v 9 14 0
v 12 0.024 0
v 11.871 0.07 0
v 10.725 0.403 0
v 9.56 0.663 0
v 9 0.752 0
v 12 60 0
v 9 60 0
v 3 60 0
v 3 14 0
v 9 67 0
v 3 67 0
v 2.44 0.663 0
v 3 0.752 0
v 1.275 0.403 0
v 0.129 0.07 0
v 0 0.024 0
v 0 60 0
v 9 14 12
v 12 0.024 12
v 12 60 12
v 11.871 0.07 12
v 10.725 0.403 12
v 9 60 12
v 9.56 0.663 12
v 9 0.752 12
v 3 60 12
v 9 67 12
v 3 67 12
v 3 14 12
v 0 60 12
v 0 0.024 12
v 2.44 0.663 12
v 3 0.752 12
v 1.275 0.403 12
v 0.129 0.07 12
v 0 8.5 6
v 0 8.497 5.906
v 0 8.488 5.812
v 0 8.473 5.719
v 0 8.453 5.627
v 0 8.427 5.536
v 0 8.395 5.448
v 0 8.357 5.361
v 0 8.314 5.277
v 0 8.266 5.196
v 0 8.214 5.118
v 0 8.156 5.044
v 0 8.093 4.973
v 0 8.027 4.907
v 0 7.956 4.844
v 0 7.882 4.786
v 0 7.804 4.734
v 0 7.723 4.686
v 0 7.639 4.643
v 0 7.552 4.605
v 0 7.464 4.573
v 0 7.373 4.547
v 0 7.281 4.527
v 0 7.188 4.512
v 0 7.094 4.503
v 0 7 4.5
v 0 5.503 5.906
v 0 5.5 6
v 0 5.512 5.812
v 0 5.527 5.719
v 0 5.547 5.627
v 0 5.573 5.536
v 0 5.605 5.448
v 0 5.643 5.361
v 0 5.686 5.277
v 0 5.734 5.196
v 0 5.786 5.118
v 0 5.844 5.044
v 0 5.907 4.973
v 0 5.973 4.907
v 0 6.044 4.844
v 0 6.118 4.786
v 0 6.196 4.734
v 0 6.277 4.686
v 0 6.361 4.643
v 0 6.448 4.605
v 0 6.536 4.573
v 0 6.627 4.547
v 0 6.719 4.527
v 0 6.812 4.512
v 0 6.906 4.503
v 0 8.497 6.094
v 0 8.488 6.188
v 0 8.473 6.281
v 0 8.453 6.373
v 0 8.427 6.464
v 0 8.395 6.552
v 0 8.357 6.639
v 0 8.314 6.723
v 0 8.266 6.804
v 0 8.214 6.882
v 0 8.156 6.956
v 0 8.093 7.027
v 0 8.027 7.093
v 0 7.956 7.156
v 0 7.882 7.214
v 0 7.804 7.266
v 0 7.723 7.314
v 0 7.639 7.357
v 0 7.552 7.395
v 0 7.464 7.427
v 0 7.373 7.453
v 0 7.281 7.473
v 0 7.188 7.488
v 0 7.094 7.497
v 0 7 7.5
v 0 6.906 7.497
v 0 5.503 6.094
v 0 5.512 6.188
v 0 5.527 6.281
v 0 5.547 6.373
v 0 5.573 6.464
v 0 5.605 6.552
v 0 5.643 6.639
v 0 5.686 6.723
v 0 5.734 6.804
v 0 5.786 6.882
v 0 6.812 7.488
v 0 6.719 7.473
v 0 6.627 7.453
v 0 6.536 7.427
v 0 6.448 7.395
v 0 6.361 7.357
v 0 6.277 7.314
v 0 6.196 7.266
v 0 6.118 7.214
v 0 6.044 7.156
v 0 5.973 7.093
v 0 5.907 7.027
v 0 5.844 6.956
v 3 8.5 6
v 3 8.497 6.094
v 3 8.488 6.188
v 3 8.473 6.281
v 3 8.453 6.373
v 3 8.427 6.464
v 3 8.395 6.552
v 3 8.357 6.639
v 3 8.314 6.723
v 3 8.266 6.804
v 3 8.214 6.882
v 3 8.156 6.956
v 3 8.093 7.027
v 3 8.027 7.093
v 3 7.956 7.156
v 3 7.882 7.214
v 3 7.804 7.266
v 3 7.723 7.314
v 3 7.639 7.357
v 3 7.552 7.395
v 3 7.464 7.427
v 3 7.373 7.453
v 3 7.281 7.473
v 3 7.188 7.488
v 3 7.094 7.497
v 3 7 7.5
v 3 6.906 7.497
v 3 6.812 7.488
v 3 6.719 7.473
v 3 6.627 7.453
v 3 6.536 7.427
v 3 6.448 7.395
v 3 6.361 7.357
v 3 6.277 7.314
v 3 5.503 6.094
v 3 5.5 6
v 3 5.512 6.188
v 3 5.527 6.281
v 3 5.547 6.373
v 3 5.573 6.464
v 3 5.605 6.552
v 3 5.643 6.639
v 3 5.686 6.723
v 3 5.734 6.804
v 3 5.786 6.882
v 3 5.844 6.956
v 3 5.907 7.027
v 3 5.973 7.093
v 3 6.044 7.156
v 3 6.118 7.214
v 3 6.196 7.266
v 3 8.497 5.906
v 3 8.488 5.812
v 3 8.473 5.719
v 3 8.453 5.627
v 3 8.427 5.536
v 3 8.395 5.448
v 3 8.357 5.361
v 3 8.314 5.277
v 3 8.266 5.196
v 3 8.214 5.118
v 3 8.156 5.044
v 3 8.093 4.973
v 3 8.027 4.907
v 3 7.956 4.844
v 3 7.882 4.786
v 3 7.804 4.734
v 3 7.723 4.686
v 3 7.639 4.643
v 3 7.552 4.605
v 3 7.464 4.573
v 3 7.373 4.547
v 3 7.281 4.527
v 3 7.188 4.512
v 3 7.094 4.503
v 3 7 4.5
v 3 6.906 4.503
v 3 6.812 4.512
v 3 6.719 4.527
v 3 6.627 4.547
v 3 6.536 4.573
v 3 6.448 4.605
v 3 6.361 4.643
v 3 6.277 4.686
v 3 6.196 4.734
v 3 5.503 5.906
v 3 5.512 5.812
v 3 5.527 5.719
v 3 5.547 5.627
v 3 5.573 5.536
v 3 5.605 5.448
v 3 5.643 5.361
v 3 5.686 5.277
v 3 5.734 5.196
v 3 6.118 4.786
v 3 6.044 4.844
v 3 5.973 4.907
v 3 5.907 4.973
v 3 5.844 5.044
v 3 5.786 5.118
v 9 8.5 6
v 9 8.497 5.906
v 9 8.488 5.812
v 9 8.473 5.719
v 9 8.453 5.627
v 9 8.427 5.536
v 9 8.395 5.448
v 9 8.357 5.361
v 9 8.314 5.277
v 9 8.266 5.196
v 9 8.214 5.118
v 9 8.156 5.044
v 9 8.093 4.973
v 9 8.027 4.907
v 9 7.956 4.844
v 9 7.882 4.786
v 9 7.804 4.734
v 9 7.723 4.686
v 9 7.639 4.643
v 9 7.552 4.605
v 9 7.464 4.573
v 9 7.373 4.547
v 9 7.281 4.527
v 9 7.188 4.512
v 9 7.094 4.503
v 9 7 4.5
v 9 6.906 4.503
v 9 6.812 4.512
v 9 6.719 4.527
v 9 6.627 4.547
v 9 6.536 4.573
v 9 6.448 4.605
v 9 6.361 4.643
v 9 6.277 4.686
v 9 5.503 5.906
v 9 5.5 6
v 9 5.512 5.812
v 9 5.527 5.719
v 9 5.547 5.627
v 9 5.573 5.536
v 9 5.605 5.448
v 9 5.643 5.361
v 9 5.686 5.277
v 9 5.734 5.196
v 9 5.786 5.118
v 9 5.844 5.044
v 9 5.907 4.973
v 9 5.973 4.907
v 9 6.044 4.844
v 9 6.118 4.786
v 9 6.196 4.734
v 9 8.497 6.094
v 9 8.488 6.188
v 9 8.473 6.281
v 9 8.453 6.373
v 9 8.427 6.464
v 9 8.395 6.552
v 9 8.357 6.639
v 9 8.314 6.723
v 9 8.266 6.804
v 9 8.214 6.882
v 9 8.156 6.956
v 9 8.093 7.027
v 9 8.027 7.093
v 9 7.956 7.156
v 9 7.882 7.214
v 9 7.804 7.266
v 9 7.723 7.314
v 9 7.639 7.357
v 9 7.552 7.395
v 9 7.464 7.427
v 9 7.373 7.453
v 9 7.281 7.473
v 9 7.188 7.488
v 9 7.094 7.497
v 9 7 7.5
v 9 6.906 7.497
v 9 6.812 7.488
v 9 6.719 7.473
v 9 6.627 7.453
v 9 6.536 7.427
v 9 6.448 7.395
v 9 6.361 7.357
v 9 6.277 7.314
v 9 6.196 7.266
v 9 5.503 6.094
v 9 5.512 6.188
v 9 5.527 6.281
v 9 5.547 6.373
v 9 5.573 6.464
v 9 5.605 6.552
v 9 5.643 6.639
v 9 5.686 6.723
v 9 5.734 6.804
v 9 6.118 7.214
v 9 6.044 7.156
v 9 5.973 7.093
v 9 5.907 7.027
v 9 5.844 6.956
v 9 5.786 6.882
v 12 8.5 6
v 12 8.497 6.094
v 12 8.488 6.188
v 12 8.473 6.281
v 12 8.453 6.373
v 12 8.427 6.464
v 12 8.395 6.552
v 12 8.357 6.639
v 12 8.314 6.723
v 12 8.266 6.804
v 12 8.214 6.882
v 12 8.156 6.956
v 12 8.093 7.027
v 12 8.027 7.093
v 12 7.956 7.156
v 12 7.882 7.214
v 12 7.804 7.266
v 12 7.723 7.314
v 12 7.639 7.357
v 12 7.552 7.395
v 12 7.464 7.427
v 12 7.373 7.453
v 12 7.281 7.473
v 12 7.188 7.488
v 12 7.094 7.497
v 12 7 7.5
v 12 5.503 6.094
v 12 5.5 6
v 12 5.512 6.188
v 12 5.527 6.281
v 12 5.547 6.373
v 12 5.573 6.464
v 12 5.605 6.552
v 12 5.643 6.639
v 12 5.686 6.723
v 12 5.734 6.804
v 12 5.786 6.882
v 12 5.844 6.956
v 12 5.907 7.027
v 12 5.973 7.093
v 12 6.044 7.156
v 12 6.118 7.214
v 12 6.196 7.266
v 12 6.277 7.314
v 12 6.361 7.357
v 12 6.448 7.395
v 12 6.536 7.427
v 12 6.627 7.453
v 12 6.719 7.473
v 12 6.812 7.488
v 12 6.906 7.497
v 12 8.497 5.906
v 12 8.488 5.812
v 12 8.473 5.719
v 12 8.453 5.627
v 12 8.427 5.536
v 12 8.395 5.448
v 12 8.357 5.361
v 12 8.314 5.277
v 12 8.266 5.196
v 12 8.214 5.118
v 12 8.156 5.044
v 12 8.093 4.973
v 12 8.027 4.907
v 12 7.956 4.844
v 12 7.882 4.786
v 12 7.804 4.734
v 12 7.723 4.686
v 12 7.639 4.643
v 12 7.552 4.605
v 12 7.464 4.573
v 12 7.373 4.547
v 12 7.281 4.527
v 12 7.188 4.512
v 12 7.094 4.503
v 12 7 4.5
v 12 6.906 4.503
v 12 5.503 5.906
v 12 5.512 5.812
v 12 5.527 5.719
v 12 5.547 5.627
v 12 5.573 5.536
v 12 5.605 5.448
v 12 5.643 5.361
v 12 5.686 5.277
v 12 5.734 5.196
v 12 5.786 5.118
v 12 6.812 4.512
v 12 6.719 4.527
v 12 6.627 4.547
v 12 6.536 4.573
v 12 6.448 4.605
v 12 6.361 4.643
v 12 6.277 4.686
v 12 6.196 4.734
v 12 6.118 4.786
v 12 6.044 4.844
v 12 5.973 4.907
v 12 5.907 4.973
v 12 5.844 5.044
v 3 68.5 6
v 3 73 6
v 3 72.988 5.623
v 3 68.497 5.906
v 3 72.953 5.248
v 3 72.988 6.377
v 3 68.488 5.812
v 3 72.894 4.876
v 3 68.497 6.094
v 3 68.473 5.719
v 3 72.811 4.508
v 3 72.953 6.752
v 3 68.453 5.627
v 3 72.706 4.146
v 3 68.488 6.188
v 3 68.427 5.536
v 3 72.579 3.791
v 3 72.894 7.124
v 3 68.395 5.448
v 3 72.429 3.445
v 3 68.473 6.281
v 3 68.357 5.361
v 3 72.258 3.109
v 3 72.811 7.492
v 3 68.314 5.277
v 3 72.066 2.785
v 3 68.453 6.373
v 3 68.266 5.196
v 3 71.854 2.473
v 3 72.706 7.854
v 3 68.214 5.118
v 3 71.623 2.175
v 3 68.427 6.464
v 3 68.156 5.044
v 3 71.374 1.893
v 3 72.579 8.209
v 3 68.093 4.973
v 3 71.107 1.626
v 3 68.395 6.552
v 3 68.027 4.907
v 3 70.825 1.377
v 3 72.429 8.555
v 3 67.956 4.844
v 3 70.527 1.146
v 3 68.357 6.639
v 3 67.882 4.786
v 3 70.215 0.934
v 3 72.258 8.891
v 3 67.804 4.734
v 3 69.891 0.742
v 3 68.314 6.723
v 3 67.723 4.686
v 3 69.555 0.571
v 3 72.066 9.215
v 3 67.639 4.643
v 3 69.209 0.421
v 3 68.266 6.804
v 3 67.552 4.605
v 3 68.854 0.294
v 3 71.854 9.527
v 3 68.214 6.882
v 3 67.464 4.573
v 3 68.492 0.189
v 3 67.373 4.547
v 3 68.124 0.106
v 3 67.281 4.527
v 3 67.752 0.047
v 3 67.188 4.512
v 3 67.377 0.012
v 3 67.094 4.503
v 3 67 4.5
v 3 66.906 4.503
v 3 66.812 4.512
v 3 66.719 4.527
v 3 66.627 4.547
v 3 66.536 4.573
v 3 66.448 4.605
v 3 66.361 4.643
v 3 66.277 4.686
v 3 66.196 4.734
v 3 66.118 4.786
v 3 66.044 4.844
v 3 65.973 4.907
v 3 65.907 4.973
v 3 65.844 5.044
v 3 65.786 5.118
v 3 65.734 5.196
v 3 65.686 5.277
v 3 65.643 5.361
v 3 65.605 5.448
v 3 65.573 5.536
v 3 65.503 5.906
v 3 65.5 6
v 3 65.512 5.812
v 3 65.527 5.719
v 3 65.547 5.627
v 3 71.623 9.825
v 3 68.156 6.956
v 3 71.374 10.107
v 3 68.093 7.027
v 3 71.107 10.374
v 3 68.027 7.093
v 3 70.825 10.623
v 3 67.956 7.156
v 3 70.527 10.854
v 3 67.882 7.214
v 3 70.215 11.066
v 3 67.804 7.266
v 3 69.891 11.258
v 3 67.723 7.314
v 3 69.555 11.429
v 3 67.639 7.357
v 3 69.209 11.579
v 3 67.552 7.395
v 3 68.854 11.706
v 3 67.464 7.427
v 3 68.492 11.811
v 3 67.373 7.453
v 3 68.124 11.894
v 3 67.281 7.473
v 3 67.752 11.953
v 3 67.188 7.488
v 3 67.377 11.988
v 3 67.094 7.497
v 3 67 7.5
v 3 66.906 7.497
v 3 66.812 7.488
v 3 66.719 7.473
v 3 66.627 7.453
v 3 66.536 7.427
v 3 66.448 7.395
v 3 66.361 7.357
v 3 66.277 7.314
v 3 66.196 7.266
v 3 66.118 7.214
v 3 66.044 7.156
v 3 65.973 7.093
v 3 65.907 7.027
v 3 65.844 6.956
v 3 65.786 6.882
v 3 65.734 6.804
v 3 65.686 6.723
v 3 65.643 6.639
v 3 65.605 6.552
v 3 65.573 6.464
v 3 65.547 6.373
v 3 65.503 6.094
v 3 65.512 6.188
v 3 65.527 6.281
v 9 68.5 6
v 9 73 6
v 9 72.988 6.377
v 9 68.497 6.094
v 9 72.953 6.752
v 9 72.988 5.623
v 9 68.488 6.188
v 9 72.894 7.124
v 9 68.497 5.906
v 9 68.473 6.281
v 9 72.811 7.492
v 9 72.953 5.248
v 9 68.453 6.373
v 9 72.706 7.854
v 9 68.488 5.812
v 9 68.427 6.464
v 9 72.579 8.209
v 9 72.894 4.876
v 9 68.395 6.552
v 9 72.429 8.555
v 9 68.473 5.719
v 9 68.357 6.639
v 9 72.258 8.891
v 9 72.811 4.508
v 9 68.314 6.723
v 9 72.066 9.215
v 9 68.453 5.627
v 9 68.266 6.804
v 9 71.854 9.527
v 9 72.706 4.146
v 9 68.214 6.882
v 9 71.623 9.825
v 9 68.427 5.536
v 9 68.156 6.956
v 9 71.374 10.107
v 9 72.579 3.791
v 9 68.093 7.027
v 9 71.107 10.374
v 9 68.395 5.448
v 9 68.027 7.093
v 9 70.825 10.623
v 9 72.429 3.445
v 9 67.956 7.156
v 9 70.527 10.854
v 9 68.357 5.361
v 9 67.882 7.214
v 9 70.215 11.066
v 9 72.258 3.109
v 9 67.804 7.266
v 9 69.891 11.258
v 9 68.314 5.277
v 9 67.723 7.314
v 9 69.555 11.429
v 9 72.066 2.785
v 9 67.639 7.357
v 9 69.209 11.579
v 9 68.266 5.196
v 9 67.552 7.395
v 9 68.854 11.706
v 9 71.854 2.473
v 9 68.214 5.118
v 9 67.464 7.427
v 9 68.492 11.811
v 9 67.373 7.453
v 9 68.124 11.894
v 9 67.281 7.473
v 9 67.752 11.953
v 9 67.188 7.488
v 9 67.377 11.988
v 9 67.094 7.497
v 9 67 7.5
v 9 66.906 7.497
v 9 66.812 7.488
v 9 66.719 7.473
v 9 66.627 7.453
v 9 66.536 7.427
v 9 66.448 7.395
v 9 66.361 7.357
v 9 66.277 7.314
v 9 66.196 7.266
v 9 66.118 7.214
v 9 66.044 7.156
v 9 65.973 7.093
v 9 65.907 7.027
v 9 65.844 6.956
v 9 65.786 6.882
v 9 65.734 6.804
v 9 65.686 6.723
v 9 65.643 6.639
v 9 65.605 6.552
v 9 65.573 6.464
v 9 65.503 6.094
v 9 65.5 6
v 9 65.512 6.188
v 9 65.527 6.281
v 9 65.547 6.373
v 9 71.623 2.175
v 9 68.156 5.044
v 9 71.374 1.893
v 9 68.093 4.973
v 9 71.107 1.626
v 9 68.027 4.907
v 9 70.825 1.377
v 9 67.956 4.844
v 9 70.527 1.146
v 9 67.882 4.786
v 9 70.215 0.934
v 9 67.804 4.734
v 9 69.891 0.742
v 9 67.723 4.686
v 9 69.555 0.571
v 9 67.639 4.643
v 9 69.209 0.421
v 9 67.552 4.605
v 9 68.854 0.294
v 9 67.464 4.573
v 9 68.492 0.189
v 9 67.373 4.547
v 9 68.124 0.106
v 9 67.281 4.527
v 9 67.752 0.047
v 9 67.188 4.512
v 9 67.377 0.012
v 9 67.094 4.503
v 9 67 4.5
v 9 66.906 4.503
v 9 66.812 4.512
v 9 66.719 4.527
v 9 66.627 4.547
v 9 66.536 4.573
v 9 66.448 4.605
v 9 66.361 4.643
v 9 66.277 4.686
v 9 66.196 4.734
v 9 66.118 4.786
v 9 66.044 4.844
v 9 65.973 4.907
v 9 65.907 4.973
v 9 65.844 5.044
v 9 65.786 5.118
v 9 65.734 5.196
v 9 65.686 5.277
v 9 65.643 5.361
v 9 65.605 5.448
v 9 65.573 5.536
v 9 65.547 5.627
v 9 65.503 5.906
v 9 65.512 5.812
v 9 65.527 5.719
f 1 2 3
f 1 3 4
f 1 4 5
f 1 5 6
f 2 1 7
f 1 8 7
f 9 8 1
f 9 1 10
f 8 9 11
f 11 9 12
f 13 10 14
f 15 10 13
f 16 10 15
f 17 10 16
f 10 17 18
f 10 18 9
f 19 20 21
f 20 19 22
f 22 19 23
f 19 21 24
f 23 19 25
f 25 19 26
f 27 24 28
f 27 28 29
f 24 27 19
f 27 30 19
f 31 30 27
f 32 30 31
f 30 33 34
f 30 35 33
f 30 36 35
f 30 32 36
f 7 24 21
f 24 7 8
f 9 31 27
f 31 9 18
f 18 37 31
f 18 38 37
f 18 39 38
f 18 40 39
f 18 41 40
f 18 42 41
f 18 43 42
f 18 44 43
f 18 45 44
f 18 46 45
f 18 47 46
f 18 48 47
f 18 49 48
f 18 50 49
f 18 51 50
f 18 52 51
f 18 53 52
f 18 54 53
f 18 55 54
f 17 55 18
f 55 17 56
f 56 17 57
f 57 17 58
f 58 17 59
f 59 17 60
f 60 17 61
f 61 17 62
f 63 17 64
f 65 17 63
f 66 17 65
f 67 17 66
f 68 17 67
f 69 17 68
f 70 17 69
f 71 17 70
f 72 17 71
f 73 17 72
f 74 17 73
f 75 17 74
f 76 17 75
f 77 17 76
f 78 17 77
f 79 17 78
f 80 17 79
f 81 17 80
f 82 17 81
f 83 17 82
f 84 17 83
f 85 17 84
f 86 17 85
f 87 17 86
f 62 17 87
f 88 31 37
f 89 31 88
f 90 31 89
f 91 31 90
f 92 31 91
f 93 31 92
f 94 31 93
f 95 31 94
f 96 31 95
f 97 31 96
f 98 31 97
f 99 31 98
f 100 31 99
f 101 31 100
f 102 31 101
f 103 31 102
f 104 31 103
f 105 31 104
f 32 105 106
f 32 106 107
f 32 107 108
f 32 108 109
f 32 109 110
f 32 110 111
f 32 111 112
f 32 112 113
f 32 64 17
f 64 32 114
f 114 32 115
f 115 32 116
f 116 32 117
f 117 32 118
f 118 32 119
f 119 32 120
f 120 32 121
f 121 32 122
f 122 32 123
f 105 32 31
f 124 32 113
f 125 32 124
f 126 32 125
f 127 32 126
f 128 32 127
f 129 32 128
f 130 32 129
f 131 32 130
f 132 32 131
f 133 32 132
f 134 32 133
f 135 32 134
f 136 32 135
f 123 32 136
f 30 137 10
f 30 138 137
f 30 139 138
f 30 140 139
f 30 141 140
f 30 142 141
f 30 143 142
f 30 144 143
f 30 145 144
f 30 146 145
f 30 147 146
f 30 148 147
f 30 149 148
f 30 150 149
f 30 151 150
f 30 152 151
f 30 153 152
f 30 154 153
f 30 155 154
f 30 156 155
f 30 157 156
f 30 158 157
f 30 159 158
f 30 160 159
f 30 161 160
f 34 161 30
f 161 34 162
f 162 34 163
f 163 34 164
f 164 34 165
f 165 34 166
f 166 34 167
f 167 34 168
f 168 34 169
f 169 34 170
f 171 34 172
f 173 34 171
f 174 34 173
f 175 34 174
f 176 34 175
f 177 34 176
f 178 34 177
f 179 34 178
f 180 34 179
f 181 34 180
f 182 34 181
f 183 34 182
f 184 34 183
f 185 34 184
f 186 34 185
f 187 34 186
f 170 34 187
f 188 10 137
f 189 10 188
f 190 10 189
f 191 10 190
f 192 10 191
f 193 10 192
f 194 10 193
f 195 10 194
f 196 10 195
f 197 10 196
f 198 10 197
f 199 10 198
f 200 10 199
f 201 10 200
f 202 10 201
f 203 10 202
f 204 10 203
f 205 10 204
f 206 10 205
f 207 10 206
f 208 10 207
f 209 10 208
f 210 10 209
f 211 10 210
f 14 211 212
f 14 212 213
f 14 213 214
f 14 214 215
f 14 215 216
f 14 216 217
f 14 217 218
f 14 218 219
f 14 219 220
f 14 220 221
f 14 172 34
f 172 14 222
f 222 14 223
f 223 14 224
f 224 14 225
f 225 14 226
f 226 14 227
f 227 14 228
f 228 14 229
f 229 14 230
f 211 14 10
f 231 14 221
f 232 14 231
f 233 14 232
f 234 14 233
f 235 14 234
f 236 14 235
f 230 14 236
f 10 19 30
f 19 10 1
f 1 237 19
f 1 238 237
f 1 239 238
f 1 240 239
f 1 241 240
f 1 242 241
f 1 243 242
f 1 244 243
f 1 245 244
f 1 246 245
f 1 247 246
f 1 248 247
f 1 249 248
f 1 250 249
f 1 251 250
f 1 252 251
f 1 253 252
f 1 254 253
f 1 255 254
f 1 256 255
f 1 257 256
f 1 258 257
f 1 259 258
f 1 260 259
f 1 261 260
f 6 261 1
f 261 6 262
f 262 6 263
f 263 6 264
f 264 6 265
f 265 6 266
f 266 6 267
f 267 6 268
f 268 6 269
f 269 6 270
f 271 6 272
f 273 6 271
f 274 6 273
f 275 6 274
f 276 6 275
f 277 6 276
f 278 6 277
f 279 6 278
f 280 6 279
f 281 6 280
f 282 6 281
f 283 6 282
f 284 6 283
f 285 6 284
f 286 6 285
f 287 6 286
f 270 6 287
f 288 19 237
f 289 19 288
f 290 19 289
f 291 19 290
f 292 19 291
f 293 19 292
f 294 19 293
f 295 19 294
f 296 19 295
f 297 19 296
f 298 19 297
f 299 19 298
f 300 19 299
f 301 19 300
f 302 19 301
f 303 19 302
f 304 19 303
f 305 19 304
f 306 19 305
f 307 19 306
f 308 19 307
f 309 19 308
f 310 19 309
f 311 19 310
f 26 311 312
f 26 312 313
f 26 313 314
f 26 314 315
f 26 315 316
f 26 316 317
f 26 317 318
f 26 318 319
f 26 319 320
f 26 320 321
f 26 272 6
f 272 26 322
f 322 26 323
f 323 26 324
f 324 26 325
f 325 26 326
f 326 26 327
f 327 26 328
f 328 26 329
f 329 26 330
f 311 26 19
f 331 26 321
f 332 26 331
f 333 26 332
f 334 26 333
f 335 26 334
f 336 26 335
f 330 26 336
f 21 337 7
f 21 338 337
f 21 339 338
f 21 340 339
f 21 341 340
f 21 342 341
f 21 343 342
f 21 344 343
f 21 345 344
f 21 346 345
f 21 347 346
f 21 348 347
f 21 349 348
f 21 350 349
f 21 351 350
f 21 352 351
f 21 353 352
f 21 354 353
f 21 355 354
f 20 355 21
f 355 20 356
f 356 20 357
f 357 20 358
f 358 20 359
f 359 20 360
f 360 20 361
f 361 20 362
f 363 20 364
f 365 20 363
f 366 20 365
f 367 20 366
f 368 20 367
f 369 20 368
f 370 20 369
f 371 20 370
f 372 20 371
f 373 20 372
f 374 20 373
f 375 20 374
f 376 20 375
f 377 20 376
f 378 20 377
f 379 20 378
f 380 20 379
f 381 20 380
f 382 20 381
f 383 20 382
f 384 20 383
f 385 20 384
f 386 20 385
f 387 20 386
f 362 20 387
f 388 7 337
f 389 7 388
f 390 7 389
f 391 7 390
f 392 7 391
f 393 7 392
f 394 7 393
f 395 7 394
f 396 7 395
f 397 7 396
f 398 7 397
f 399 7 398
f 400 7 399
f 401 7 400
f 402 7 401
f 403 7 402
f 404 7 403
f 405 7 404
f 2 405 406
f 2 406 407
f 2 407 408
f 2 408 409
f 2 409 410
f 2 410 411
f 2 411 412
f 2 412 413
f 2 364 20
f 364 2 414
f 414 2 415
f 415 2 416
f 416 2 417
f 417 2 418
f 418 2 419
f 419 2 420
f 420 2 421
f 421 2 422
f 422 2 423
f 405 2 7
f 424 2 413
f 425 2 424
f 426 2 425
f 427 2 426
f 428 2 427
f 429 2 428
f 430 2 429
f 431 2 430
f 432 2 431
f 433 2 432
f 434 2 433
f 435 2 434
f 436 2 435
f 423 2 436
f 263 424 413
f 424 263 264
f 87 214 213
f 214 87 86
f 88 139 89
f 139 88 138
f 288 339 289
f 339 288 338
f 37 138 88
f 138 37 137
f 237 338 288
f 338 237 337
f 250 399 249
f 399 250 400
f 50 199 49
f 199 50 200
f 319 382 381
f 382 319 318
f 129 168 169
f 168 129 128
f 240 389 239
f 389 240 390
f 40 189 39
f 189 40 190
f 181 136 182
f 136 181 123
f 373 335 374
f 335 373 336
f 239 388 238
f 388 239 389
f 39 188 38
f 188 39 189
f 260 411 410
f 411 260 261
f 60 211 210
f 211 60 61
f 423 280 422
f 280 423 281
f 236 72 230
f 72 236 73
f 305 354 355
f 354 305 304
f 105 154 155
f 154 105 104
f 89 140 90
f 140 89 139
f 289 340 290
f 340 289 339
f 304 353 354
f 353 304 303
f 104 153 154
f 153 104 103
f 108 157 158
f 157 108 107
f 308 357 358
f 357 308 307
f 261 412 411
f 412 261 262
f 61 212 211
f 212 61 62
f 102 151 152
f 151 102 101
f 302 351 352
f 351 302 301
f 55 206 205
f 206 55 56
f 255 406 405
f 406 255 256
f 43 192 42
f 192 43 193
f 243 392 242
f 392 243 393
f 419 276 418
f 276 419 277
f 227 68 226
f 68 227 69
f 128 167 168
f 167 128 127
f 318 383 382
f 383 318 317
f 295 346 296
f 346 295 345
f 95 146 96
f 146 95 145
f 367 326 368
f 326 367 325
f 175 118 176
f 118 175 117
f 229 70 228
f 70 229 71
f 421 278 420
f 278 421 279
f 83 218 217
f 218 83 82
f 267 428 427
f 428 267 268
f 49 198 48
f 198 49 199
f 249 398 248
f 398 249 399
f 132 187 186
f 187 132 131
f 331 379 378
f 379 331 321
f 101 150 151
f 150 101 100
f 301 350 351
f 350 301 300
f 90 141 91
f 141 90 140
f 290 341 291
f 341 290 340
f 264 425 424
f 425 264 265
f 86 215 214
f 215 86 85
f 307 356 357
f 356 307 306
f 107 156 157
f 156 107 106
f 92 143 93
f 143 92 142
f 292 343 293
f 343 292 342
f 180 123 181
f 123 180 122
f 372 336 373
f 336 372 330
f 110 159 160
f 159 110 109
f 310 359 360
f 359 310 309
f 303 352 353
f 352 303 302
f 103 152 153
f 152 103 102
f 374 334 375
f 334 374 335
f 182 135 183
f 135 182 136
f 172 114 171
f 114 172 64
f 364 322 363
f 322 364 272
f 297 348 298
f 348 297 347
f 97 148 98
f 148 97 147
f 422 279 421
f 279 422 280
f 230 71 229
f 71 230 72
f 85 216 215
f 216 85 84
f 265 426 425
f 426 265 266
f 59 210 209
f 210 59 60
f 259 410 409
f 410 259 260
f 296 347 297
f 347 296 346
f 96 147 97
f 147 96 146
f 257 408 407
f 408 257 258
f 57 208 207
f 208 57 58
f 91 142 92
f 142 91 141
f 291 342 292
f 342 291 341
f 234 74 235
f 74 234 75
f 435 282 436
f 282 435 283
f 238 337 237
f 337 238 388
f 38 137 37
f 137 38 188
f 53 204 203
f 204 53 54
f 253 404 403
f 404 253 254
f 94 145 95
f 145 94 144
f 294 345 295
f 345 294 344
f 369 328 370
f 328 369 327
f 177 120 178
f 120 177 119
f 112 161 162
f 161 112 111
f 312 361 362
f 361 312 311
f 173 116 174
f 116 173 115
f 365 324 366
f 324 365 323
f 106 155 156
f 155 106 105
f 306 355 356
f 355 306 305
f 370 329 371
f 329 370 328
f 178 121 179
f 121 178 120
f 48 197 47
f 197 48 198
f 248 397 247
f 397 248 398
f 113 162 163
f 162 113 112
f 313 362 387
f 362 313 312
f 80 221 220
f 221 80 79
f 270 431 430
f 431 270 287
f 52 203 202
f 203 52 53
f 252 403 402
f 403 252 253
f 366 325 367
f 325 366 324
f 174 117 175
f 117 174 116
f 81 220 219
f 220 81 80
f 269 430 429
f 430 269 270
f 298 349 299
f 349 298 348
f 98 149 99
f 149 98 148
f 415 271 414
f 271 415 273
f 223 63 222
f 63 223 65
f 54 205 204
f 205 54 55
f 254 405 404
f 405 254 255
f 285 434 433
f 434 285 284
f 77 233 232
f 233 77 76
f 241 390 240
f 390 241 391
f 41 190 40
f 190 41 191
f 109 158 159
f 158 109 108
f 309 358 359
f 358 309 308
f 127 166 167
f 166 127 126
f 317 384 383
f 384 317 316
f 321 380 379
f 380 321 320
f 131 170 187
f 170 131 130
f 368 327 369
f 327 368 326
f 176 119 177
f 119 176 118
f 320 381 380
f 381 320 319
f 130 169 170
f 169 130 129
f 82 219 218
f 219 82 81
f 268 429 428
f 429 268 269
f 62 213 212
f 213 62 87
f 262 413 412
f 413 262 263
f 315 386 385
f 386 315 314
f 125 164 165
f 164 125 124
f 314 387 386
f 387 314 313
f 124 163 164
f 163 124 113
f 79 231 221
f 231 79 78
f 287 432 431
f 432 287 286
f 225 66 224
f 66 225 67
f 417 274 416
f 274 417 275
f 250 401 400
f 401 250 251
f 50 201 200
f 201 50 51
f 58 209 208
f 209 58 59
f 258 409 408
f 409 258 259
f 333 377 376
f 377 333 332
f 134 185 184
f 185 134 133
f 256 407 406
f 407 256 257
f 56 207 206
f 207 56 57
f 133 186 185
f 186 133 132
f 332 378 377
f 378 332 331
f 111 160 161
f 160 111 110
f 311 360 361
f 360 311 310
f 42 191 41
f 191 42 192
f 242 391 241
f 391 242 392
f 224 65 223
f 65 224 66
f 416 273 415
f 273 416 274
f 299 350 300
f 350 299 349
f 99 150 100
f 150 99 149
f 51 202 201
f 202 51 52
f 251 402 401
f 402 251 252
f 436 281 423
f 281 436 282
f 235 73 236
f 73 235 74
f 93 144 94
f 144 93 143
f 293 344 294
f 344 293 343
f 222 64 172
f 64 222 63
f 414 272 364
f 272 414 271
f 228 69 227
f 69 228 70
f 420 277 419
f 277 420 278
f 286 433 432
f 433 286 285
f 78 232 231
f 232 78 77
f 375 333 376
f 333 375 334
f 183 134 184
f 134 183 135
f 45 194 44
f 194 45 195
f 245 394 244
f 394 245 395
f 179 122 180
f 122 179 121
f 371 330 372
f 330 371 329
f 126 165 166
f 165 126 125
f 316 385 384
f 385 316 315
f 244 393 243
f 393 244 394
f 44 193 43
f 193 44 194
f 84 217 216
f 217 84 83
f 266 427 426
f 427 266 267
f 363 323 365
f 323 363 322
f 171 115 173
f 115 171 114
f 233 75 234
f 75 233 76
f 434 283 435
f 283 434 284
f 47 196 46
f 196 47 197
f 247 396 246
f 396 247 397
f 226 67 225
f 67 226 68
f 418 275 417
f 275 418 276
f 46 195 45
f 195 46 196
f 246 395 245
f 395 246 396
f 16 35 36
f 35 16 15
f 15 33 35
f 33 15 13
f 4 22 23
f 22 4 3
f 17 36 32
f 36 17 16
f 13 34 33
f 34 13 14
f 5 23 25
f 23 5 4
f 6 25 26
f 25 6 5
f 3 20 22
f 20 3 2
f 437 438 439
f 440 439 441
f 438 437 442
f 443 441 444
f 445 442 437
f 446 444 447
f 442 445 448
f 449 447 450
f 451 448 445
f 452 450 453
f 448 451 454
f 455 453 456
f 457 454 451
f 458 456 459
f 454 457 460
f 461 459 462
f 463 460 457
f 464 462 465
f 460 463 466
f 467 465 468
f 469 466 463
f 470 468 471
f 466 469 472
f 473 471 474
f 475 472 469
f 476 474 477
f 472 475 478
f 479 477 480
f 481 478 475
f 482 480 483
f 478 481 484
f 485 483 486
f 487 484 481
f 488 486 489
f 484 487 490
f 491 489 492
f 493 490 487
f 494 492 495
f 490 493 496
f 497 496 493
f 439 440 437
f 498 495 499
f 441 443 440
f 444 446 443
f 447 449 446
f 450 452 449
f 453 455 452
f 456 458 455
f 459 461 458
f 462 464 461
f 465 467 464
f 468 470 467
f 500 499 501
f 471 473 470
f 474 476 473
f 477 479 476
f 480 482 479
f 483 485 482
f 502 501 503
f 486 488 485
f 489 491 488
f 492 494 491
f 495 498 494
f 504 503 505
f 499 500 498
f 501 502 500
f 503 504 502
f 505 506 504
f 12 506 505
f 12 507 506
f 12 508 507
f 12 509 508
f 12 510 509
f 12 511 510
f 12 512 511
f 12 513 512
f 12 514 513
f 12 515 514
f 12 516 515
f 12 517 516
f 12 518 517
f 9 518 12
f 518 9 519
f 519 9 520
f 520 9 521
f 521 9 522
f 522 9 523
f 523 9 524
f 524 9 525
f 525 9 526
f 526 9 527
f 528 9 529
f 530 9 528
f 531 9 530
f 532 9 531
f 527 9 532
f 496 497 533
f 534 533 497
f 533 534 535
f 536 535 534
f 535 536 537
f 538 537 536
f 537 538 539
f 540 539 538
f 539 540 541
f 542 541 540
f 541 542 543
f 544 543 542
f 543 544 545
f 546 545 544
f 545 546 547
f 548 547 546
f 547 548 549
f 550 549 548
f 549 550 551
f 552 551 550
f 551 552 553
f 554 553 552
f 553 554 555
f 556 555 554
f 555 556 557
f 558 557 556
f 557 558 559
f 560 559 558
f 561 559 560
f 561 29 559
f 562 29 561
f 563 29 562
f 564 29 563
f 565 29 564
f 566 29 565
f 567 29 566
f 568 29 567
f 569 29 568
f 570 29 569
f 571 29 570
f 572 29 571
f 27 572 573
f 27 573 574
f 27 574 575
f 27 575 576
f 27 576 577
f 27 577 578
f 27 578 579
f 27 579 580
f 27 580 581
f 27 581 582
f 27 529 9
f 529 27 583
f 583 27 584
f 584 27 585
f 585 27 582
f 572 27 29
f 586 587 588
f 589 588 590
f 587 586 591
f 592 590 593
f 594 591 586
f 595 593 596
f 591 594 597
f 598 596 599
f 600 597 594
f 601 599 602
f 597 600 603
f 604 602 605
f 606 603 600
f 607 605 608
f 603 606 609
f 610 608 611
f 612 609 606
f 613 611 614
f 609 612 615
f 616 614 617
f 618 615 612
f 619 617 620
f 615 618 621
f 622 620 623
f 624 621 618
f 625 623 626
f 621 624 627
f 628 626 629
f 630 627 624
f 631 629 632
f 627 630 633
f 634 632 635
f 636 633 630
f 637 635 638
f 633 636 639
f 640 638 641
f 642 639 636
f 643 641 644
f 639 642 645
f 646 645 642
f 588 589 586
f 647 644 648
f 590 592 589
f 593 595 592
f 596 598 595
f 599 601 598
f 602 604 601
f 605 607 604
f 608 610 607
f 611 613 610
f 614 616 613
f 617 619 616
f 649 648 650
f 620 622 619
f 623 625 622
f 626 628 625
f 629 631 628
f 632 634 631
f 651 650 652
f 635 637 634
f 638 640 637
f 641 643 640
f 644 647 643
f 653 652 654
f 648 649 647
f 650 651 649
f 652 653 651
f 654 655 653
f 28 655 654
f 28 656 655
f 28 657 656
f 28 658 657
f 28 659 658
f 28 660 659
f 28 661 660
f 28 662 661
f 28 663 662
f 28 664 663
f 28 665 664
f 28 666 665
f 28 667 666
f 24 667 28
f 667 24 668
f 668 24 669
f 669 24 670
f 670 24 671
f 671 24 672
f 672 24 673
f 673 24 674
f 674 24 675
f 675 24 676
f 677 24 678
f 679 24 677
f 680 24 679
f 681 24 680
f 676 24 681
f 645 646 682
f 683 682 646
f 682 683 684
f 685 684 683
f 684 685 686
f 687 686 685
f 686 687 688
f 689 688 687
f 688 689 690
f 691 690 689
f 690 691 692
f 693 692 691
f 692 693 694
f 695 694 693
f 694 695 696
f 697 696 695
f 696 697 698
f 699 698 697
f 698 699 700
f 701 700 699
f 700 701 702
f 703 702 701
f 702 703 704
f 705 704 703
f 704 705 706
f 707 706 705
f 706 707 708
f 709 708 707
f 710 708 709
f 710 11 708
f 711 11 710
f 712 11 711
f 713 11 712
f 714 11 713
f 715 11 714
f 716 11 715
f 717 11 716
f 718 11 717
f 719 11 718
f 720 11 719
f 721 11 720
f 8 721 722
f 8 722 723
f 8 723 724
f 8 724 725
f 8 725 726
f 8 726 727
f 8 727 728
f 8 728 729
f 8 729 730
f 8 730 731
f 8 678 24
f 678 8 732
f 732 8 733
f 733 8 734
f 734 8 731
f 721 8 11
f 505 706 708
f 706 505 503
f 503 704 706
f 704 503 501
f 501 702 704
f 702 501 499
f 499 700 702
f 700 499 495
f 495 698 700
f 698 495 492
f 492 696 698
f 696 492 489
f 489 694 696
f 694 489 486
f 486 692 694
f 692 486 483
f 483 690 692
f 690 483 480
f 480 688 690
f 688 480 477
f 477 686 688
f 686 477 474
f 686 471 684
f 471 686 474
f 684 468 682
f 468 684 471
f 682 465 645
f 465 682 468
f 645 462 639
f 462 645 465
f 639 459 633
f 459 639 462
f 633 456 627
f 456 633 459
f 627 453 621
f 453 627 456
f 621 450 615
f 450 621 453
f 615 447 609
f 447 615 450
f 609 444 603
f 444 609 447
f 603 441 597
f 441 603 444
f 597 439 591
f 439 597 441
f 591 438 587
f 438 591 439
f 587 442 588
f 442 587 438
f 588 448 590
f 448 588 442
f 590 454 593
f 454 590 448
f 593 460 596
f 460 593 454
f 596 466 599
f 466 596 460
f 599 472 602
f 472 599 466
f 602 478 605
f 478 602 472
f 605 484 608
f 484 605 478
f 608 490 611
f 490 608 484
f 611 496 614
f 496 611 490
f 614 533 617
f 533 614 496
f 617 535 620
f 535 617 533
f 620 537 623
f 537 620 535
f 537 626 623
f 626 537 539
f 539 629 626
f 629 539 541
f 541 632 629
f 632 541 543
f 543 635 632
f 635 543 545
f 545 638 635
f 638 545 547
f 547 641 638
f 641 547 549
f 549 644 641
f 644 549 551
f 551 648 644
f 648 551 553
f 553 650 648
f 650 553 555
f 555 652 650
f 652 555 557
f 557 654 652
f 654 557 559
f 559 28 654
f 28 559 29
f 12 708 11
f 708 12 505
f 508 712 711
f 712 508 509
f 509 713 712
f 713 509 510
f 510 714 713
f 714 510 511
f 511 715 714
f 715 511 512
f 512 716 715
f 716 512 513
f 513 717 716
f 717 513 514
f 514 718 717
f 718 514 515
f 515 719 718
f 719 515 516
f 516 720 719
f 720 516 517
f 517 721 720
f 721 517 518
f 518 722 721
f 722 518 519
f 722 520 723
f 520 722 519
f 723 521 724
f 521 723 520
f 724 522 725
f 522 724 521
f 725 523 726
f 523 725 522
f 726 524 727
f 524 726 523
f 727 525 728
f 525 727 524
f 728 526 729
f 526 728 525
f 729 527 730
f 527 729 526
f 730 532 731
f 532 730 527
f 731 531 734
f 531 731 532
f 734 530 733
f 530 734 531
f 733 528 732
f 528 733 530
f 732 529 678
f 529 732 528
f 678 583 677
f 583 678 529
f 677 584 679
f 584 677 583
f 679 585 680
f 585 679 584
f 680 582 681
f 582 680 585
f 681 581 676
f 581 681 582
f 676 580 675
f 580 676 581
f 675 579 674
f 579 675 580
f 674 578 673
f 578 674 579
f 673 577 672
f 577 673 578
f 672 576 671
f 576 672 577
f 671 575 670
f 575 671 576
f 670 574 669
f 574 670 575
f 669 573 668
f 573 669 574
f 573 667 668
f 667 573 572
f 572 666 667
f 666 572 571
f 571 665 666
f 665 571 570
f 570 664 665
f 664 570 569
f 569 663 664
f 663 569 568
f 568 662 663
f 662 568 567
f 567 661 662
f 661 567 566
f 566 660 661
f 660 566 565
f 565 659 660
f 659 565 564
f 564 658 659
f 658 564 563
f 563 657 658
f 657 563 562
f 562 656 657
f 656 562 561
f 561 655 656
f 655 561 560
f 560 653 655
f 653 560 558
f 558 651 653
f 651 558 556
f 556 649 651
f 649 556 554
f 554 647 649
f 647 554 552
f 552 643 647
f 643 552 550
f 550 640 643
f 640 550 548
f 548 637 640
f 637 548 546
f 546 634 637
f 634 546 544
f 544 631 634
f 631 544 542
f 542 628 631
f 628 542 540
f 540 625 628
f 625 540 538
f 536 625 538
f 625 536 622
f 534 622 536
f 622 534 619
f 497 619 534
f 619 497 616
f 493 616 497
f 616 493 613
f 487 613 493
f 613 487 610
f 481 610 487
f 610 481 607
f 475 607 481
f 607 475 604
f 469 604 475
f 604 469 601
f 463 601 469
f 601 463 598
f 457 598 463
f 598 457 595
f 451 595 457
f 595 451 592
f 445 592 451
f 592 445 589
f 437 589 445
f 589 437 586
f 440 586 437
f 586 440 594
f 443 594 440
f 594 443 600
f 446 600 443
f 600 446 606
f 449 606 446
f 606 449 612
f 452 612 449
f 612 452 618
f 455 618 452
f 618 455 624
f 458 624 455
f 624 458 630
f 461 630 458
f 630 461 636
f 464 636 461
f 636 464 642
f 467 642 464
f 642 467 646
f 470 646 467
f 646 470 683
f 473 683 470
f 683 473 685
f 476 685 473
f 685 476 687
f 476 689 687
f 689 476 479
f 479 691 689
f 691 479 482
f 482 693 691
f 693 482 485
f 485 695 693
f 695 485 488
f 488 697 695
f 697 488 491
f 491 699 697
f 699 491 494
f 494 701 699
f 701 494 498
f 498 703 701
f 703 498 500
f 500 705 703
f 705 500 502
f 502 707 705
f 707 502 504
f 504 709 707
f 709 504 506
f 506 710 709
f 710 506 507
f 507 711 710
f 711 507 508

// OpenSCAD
// file: ../../jabra/jabra-510.scad
// Jabra Speak 510

function jabra510_footplate_diameter() = 96; // mm
function jabra510_footplate_edge_thickness() = 5; // hard to measure precisely because of soft material
function jabra510_groove_diameter() = 71;
function jabra510_groove_height() = 5;

function jabra510_holder_baseplate_thickness() = 6;
function jabra510_footplate_holder_thickness() = 2;
function jabra510_footplate_holder_groove_depth() = 4;

function jabra510_footplate_holder_slide_in_clearance() = 20; // To be able to slide Jabra into holder, it needs this many millimeters of clearance
function jabra510_body_ground_clearance() = 11; // the body of the Jabra 510 is is this many millimeters from 'ground'

function jabra510_footplate_holder_tolerance_x() = 0.5; // provide somewhat loose fit
function jabra510_footplate_holder_tolerance_y() = 0.3; // provide somewhat loose fit, but not too loose. Helps to keep Jabra in place.

footplate_radius = jabra510_footplate_diameter() / 2 + jabra510_footplate_holder_tolerance_x();
hollow_footplate_outer_skirt_width = 10;
hollow_footplate_spoke_width = 10;

module jabra510_footplate_holder_cross_section() {    
    clamp_section_width = jabra510_footplate_holder_groove_depth() + jabra510_footplate_holder_thickness();
    clamp_section_x = footplate_radius - jabra510_footplate_holder_groove_depth();
    clamp_section_y = jabra510_holder_baseplate_thickness() + jabra510_footplate_edge_thickness() + jabra510_footplate_holder_tolerance_y();
    
    union() {
        translate([footplate_radius, 0, 0]) square([jabra510_footplate_holder_thickness(), clamp_section_y]);
        translate([clamp_section_x, clamp_section_y, 0]) square([clamp_section_width, jabra510_footplate_holder_thickness()]);
    }
}

module jabra510_footplate_cutout() {
    r = footplate_radius - hollow_footplate_outer_skirt_width;
    
    difference() {
        circle(r = r);
    }
}

module jabra510_hollow_footplate() {
    r = footplate_radius + 0.1; // resolve 'Object may not be a valid 2-manifold and may need repair' issue

    linear_extrude(jabra510_holder_baseplate_thickness())
    difference() {
        circle(r = r);
        jabra510_footplate_cutout();
    }
}

module jabra510_footplate_holder() {
    union() {
        jabra510_hollow_footplate();
        rotate_extrude(angle = 180) jabra510_footplate_holder_cross_section();
    }
}

jabra510_footplate_holder();
// file: ../../tv-stand/perlegear.scad
// Perlegear TV Stand Rollable TV Trolley for 13-50 Inch TVs with 30° Tilt,
// https://www.amazon.de/dp/B0BPG8PY1R
// --------------------------------------------------------

function perlegear_upper_tube_diameter() = 38;
function perlegear_upper_tube_bore_distance() = 40;
function perlegear_upper_tube_bore_diameter() = 7;
function perlegear_screw_mount_tube_carve_depth() = 1;

function perlegear_screw_mount_default_width() = 12;
function perlegear_screw_mount_default_thickness() = 10;

module perlegear_screw_mount_2d_shape(
    w = perlegear_screw_mount_default_width(),
    o = 0, // top overhang
    u = 0  // bottom overhang
) {
    d = perlegear_upper_tube_bore_diameter();
    o = o + perlegear_upper_tube_bore_distance();

    difference() {
        hull() {
            translate([0, -u, 0]) circle(d = w);
            translate([0, o, 0]) circle(d = w);
        }
        translate([0, 0, 0]) circle(d = d); // bottom bore
        translate([0, perlegear_upper_tube_bore_distance(), 0]) circle(d = d); // top bore
    }
}

module perlegear_screw_mount_base(
    w = perlegear_screw_mount_default_width(),
    t = perlegear_screw_mount_default_thickness(),
    o = 0, // top overhang
    u = 0  // bottom overhang
){
    linear_extrude(t) {
        perlegear_screw_mount_2d_shape(w = w, o = o, u = u);
    }
}

module perlegear_upper_tube(h){
    z = perlegear_screw_mount_tube_carve_depth() - perlegear_upper_tube_diameter() / 2;

    translate([0, 0, z])
        rotate([-90, 0, 0])
            cylinder(h = h, d = perlegear_upper_tube_diameter());
}

module perlegear_screw_mount(
    w = perlegear_screw_mount_default_width(),
    t = perlegear_screw_mount_default_thickness(),
    o = 0, // top overhang
    u = 0  // bottom overhang
){
    h = w + perlegear_upper_tube_bore_distance() + u + o;
    y_offset = w / 2 + u;

    difference() {
        translate([0, y_offset, 0])
        perlegear_screw_mount_base(w = w, t = t, o = o, u = u);
        perlegear_upper_tube(h = h);
    }
}

perlegear_screw_mount();
translate([30, 0, 0]) perlegear_screw_mount(o = 10);
translate([60, 0, 0]) perlegear_screw_mount(u = 10);
translate([90, 0, 0]) perlegear_screw_mount(o = 10, u = 10);
// file: perlegear_jabra510.scad
use <../../tv-stand/perlegear.scad>
use <../../jabra/jabra-510.scad>

w = 12;
function extension_arm_length() = 60;
function extension_arm_w() = w;
function extension_arm_h() = 12;
function extension_arm_margin_top() = 4;
function extension_arm_margin_bottom() = 6;

function perlegear_mount_w() = w;
function perlegear_mount_t() = 14;
function perlegear_mount_u() = extension_arm_h() + extension_arm_margin_top() + extension_arm_margin_bottom();

function extension_groove_depth() = 3;
function safety_pin_d() = 3;

function jabra_swivel_bore_d() = 3;
function jabra_swivel_overhang() = 1;
function jabra_arm_hook_stretch() = 10;
function jabra_arm_hook_center_x() = extension_arm_h() / 2;
function jabra_arm_hook_center_y() = extension_arm_h() / 2 + jabra_arm_hook_stretch();

function jabra_swivel_bore_center_y_offset() = extension_arm_length() + jabra_arm_hook_stretch();

module perlegear_mount() {
    mount_offset_y = - extension_arm_h() / 2 - extension_arm_margin_bottom();
    translate([0, mount_offset_y, 0])
        perlegear_screw_mount(w = perlegear_mount_w(), t = perlegear_mount_t(), u = perlegear_mount_u());
}

module perlegear_mount_w_extension_groove() {
    x = extension_groove_depth();
    y = extension_arm_h();
    z = perlegear_mount_t();
    
    offset_x = w / 2 - extension_groove_depth() / 2;
    offset_z = perlegear_mount_t() / 2;
    
    pin_h = w;
    pin_offset_x = -w / 2;
    pin_offset_z = perlegear_mount_t() / 2;
    
    difference() {
        perlegear_mount();
        translate([-offset_x, 0, offset_z]) cube([x, y, z], center = true); 
        translate([offset_x, 0, offset_z]) cube([x, y, z], center = true);
        
        translate([pin_offset_x, 0, pin_offset_z])
            rotate([0, 90, 0]) cylinder(h = pin_h, d = safety_pin_d());
    }
}

module extension_arm_2d_shape() {
    perlegear_cutout_y = perlegear_mount_w() - 2 * extension_groove_depth();
    cutout_offset_x = extension_arm_length() / 2 - perlegear_mount_t() / 2;

    difference() {
        square([extension_arm_length(), extension_arm_w()], center = true);
        translate([-cutout_offset_x, 0, 0])
            square([perlegear_mount_t(), perlegear_cutout_y], center = true);
    }
}

module extension_arm_jabra_end() {
    swivel_d = extension_arm_h();
    swivel_offset_x = swivel_d / 2 + jabra_swivel_overhang();
    swivel_w = extension_arm_w() - 2 * extension_groove_depth();

    rotate([90, 0, 0])
        linear_extrude(swivel_w) {
            difference() {
                hull() {
                    square([1, extension_arm_h()], center = true);
                    translate([swivel_offset_x, 0, 0]) circle(d = swivel_d);
                }
                translate([swivel_offset_x, 0, 0]) circle(d = jabra_swivel_bore_d());
            }
        }
}

module extension_arm() {
    pin_h = extension_arm_w();
    pin_offset_x = - (extension_arm_length() - perlegear_mount_t()) / 2;
    pin_offset_y = extension_arm_h() / 2;
    pin_offset_z = extension_arm_w() / 2;

    swivel_offset_x = extension_arm_length() / 2;
    swivel_offset_y = extension_groove_depth();
   
    perlegear_tube_offset_x = perlegear_screw_mount_tube_carve_depth() - (extension_arm_length() + perlegear_upper_tube_diameter()) / 2;
    perlegear_tube_offset_z = extension_arm_h() / 2;
    
    union() {
        difference() {
            linear_extrude(extension_arm_h()) extension_arm_2d_shape();
            translate([pin_offset_x, pin_offset_y, pin_offset_z])
                rotate([90, 0, 0]) cylinder(h = pin_h, d = safety_pin_d());
            translate([perlegear_tube_offset_x, 0, perlegear_tube_offset_z]) cylinder(d = perlegear_upper_tube_diameter(), h = extension_arm_h(), center = true);

        }
        translate([swivel_offset_x, swivel_offset_y, extension_arm_w() / 2]) extension_arm_jabra_end();
    }
}


module jabra_extension_arm_hook() {
    curvature_r = 13;
    curvature_offset_x = curvature_r + jabra510_holder_baseplate_thickness();

    hook_center_offset_x = extension_groove_depth() / 2;
    hook_w = extension_groove_depth();

    translate([hook_center_offset_x, 0, 0])
    rotate([0, -90, 0])
    linear_extrude(hook_w)
    difference() {
        hull() {
            square(jabra510_holder_baseplate_thickness());
            translate([jabra_arm_hook_center_x(), jabra_arm_hook_center_y(), 0]) circle(d = extension_arm_h());
        }
        translate([jabra_arm_hook_center_x(), jabra_arm_hook_center_y(), 0]) circle(d = jabra_swivel_bore_d());
        translate([curvature_offset_x, 0]) circle(r = curvature_r);
    }
}

module jabra_console_extension() {
    offset_x_min = extension_arm_w() / 2;
    hook_overlap = jabra_arm_hook_stretch();
    console_overlap_y = -15; // extension will overlap with console. Must have enough clearance though
    console_overlap_offset_x = jabra510_footplate_diameter() / 3;

    y = jabra510_footplate_holder_slide_in_clearance();
    hook_overlap_y = jabra510_footplate_holder_slide_in_clearance() + hook_overlap;
    hook_offset_x = extension_arm_w() / 2 - extension_groove_depth() / 2;

    points = [
        [-console_overlap_offset_x, console_overlap_y],
        [-offset_x_min, hook_overlap_y],
        [offset_x_min, hook_overlap_y],
        [console_overlap_offset_x, console_overlap_y]
    ];
    
    union() {
        linear_extrude(jabra510_holder_baseplate_thickness())
            difference() {
                polygon(points = points);
                translate([0, -jabra510_footplate_diameter() / 2, 0]) circle(d = jabra510_footplate_diameter());
        }
        translate([-hook_offset_x, y, 0]) jabra_extension_arm_hook();
        translate([hook_offset_x, y, 0]) jabra_extension_arm_hook();
    }
}

module jabra_console() {
    union() {
        rotate([0, 0, 180]) jabra510_footplate_holder();
        translate([0, jabra510_footplate_diameter() / 2, 0]) jabra_console_extension();
    }
}

translate([perlegear_mount_w() / 2, extension_arm_h(), perlegear_mount_t()]) rotate([0, 180, 0]) perlegear_mount_w_extension_groove();
translate([30, extension_arm_length() / 2, 0]) rotate([0, 0, 90]) extension_arm();

jabra510_holder_y = jabra510_footplate_diameter() / 2 + jabra510_footplate_holder_thickness();
translate([100, jabra510_holder_y, 0]) jabra_console();
// main file
use <perlegear_jabra510.scad>

$fn = 100;

translate([extension_arm_w() / 2, extension_arm_length() / 2, 0]) rotate([0, 0, 90]) extension_arm();
